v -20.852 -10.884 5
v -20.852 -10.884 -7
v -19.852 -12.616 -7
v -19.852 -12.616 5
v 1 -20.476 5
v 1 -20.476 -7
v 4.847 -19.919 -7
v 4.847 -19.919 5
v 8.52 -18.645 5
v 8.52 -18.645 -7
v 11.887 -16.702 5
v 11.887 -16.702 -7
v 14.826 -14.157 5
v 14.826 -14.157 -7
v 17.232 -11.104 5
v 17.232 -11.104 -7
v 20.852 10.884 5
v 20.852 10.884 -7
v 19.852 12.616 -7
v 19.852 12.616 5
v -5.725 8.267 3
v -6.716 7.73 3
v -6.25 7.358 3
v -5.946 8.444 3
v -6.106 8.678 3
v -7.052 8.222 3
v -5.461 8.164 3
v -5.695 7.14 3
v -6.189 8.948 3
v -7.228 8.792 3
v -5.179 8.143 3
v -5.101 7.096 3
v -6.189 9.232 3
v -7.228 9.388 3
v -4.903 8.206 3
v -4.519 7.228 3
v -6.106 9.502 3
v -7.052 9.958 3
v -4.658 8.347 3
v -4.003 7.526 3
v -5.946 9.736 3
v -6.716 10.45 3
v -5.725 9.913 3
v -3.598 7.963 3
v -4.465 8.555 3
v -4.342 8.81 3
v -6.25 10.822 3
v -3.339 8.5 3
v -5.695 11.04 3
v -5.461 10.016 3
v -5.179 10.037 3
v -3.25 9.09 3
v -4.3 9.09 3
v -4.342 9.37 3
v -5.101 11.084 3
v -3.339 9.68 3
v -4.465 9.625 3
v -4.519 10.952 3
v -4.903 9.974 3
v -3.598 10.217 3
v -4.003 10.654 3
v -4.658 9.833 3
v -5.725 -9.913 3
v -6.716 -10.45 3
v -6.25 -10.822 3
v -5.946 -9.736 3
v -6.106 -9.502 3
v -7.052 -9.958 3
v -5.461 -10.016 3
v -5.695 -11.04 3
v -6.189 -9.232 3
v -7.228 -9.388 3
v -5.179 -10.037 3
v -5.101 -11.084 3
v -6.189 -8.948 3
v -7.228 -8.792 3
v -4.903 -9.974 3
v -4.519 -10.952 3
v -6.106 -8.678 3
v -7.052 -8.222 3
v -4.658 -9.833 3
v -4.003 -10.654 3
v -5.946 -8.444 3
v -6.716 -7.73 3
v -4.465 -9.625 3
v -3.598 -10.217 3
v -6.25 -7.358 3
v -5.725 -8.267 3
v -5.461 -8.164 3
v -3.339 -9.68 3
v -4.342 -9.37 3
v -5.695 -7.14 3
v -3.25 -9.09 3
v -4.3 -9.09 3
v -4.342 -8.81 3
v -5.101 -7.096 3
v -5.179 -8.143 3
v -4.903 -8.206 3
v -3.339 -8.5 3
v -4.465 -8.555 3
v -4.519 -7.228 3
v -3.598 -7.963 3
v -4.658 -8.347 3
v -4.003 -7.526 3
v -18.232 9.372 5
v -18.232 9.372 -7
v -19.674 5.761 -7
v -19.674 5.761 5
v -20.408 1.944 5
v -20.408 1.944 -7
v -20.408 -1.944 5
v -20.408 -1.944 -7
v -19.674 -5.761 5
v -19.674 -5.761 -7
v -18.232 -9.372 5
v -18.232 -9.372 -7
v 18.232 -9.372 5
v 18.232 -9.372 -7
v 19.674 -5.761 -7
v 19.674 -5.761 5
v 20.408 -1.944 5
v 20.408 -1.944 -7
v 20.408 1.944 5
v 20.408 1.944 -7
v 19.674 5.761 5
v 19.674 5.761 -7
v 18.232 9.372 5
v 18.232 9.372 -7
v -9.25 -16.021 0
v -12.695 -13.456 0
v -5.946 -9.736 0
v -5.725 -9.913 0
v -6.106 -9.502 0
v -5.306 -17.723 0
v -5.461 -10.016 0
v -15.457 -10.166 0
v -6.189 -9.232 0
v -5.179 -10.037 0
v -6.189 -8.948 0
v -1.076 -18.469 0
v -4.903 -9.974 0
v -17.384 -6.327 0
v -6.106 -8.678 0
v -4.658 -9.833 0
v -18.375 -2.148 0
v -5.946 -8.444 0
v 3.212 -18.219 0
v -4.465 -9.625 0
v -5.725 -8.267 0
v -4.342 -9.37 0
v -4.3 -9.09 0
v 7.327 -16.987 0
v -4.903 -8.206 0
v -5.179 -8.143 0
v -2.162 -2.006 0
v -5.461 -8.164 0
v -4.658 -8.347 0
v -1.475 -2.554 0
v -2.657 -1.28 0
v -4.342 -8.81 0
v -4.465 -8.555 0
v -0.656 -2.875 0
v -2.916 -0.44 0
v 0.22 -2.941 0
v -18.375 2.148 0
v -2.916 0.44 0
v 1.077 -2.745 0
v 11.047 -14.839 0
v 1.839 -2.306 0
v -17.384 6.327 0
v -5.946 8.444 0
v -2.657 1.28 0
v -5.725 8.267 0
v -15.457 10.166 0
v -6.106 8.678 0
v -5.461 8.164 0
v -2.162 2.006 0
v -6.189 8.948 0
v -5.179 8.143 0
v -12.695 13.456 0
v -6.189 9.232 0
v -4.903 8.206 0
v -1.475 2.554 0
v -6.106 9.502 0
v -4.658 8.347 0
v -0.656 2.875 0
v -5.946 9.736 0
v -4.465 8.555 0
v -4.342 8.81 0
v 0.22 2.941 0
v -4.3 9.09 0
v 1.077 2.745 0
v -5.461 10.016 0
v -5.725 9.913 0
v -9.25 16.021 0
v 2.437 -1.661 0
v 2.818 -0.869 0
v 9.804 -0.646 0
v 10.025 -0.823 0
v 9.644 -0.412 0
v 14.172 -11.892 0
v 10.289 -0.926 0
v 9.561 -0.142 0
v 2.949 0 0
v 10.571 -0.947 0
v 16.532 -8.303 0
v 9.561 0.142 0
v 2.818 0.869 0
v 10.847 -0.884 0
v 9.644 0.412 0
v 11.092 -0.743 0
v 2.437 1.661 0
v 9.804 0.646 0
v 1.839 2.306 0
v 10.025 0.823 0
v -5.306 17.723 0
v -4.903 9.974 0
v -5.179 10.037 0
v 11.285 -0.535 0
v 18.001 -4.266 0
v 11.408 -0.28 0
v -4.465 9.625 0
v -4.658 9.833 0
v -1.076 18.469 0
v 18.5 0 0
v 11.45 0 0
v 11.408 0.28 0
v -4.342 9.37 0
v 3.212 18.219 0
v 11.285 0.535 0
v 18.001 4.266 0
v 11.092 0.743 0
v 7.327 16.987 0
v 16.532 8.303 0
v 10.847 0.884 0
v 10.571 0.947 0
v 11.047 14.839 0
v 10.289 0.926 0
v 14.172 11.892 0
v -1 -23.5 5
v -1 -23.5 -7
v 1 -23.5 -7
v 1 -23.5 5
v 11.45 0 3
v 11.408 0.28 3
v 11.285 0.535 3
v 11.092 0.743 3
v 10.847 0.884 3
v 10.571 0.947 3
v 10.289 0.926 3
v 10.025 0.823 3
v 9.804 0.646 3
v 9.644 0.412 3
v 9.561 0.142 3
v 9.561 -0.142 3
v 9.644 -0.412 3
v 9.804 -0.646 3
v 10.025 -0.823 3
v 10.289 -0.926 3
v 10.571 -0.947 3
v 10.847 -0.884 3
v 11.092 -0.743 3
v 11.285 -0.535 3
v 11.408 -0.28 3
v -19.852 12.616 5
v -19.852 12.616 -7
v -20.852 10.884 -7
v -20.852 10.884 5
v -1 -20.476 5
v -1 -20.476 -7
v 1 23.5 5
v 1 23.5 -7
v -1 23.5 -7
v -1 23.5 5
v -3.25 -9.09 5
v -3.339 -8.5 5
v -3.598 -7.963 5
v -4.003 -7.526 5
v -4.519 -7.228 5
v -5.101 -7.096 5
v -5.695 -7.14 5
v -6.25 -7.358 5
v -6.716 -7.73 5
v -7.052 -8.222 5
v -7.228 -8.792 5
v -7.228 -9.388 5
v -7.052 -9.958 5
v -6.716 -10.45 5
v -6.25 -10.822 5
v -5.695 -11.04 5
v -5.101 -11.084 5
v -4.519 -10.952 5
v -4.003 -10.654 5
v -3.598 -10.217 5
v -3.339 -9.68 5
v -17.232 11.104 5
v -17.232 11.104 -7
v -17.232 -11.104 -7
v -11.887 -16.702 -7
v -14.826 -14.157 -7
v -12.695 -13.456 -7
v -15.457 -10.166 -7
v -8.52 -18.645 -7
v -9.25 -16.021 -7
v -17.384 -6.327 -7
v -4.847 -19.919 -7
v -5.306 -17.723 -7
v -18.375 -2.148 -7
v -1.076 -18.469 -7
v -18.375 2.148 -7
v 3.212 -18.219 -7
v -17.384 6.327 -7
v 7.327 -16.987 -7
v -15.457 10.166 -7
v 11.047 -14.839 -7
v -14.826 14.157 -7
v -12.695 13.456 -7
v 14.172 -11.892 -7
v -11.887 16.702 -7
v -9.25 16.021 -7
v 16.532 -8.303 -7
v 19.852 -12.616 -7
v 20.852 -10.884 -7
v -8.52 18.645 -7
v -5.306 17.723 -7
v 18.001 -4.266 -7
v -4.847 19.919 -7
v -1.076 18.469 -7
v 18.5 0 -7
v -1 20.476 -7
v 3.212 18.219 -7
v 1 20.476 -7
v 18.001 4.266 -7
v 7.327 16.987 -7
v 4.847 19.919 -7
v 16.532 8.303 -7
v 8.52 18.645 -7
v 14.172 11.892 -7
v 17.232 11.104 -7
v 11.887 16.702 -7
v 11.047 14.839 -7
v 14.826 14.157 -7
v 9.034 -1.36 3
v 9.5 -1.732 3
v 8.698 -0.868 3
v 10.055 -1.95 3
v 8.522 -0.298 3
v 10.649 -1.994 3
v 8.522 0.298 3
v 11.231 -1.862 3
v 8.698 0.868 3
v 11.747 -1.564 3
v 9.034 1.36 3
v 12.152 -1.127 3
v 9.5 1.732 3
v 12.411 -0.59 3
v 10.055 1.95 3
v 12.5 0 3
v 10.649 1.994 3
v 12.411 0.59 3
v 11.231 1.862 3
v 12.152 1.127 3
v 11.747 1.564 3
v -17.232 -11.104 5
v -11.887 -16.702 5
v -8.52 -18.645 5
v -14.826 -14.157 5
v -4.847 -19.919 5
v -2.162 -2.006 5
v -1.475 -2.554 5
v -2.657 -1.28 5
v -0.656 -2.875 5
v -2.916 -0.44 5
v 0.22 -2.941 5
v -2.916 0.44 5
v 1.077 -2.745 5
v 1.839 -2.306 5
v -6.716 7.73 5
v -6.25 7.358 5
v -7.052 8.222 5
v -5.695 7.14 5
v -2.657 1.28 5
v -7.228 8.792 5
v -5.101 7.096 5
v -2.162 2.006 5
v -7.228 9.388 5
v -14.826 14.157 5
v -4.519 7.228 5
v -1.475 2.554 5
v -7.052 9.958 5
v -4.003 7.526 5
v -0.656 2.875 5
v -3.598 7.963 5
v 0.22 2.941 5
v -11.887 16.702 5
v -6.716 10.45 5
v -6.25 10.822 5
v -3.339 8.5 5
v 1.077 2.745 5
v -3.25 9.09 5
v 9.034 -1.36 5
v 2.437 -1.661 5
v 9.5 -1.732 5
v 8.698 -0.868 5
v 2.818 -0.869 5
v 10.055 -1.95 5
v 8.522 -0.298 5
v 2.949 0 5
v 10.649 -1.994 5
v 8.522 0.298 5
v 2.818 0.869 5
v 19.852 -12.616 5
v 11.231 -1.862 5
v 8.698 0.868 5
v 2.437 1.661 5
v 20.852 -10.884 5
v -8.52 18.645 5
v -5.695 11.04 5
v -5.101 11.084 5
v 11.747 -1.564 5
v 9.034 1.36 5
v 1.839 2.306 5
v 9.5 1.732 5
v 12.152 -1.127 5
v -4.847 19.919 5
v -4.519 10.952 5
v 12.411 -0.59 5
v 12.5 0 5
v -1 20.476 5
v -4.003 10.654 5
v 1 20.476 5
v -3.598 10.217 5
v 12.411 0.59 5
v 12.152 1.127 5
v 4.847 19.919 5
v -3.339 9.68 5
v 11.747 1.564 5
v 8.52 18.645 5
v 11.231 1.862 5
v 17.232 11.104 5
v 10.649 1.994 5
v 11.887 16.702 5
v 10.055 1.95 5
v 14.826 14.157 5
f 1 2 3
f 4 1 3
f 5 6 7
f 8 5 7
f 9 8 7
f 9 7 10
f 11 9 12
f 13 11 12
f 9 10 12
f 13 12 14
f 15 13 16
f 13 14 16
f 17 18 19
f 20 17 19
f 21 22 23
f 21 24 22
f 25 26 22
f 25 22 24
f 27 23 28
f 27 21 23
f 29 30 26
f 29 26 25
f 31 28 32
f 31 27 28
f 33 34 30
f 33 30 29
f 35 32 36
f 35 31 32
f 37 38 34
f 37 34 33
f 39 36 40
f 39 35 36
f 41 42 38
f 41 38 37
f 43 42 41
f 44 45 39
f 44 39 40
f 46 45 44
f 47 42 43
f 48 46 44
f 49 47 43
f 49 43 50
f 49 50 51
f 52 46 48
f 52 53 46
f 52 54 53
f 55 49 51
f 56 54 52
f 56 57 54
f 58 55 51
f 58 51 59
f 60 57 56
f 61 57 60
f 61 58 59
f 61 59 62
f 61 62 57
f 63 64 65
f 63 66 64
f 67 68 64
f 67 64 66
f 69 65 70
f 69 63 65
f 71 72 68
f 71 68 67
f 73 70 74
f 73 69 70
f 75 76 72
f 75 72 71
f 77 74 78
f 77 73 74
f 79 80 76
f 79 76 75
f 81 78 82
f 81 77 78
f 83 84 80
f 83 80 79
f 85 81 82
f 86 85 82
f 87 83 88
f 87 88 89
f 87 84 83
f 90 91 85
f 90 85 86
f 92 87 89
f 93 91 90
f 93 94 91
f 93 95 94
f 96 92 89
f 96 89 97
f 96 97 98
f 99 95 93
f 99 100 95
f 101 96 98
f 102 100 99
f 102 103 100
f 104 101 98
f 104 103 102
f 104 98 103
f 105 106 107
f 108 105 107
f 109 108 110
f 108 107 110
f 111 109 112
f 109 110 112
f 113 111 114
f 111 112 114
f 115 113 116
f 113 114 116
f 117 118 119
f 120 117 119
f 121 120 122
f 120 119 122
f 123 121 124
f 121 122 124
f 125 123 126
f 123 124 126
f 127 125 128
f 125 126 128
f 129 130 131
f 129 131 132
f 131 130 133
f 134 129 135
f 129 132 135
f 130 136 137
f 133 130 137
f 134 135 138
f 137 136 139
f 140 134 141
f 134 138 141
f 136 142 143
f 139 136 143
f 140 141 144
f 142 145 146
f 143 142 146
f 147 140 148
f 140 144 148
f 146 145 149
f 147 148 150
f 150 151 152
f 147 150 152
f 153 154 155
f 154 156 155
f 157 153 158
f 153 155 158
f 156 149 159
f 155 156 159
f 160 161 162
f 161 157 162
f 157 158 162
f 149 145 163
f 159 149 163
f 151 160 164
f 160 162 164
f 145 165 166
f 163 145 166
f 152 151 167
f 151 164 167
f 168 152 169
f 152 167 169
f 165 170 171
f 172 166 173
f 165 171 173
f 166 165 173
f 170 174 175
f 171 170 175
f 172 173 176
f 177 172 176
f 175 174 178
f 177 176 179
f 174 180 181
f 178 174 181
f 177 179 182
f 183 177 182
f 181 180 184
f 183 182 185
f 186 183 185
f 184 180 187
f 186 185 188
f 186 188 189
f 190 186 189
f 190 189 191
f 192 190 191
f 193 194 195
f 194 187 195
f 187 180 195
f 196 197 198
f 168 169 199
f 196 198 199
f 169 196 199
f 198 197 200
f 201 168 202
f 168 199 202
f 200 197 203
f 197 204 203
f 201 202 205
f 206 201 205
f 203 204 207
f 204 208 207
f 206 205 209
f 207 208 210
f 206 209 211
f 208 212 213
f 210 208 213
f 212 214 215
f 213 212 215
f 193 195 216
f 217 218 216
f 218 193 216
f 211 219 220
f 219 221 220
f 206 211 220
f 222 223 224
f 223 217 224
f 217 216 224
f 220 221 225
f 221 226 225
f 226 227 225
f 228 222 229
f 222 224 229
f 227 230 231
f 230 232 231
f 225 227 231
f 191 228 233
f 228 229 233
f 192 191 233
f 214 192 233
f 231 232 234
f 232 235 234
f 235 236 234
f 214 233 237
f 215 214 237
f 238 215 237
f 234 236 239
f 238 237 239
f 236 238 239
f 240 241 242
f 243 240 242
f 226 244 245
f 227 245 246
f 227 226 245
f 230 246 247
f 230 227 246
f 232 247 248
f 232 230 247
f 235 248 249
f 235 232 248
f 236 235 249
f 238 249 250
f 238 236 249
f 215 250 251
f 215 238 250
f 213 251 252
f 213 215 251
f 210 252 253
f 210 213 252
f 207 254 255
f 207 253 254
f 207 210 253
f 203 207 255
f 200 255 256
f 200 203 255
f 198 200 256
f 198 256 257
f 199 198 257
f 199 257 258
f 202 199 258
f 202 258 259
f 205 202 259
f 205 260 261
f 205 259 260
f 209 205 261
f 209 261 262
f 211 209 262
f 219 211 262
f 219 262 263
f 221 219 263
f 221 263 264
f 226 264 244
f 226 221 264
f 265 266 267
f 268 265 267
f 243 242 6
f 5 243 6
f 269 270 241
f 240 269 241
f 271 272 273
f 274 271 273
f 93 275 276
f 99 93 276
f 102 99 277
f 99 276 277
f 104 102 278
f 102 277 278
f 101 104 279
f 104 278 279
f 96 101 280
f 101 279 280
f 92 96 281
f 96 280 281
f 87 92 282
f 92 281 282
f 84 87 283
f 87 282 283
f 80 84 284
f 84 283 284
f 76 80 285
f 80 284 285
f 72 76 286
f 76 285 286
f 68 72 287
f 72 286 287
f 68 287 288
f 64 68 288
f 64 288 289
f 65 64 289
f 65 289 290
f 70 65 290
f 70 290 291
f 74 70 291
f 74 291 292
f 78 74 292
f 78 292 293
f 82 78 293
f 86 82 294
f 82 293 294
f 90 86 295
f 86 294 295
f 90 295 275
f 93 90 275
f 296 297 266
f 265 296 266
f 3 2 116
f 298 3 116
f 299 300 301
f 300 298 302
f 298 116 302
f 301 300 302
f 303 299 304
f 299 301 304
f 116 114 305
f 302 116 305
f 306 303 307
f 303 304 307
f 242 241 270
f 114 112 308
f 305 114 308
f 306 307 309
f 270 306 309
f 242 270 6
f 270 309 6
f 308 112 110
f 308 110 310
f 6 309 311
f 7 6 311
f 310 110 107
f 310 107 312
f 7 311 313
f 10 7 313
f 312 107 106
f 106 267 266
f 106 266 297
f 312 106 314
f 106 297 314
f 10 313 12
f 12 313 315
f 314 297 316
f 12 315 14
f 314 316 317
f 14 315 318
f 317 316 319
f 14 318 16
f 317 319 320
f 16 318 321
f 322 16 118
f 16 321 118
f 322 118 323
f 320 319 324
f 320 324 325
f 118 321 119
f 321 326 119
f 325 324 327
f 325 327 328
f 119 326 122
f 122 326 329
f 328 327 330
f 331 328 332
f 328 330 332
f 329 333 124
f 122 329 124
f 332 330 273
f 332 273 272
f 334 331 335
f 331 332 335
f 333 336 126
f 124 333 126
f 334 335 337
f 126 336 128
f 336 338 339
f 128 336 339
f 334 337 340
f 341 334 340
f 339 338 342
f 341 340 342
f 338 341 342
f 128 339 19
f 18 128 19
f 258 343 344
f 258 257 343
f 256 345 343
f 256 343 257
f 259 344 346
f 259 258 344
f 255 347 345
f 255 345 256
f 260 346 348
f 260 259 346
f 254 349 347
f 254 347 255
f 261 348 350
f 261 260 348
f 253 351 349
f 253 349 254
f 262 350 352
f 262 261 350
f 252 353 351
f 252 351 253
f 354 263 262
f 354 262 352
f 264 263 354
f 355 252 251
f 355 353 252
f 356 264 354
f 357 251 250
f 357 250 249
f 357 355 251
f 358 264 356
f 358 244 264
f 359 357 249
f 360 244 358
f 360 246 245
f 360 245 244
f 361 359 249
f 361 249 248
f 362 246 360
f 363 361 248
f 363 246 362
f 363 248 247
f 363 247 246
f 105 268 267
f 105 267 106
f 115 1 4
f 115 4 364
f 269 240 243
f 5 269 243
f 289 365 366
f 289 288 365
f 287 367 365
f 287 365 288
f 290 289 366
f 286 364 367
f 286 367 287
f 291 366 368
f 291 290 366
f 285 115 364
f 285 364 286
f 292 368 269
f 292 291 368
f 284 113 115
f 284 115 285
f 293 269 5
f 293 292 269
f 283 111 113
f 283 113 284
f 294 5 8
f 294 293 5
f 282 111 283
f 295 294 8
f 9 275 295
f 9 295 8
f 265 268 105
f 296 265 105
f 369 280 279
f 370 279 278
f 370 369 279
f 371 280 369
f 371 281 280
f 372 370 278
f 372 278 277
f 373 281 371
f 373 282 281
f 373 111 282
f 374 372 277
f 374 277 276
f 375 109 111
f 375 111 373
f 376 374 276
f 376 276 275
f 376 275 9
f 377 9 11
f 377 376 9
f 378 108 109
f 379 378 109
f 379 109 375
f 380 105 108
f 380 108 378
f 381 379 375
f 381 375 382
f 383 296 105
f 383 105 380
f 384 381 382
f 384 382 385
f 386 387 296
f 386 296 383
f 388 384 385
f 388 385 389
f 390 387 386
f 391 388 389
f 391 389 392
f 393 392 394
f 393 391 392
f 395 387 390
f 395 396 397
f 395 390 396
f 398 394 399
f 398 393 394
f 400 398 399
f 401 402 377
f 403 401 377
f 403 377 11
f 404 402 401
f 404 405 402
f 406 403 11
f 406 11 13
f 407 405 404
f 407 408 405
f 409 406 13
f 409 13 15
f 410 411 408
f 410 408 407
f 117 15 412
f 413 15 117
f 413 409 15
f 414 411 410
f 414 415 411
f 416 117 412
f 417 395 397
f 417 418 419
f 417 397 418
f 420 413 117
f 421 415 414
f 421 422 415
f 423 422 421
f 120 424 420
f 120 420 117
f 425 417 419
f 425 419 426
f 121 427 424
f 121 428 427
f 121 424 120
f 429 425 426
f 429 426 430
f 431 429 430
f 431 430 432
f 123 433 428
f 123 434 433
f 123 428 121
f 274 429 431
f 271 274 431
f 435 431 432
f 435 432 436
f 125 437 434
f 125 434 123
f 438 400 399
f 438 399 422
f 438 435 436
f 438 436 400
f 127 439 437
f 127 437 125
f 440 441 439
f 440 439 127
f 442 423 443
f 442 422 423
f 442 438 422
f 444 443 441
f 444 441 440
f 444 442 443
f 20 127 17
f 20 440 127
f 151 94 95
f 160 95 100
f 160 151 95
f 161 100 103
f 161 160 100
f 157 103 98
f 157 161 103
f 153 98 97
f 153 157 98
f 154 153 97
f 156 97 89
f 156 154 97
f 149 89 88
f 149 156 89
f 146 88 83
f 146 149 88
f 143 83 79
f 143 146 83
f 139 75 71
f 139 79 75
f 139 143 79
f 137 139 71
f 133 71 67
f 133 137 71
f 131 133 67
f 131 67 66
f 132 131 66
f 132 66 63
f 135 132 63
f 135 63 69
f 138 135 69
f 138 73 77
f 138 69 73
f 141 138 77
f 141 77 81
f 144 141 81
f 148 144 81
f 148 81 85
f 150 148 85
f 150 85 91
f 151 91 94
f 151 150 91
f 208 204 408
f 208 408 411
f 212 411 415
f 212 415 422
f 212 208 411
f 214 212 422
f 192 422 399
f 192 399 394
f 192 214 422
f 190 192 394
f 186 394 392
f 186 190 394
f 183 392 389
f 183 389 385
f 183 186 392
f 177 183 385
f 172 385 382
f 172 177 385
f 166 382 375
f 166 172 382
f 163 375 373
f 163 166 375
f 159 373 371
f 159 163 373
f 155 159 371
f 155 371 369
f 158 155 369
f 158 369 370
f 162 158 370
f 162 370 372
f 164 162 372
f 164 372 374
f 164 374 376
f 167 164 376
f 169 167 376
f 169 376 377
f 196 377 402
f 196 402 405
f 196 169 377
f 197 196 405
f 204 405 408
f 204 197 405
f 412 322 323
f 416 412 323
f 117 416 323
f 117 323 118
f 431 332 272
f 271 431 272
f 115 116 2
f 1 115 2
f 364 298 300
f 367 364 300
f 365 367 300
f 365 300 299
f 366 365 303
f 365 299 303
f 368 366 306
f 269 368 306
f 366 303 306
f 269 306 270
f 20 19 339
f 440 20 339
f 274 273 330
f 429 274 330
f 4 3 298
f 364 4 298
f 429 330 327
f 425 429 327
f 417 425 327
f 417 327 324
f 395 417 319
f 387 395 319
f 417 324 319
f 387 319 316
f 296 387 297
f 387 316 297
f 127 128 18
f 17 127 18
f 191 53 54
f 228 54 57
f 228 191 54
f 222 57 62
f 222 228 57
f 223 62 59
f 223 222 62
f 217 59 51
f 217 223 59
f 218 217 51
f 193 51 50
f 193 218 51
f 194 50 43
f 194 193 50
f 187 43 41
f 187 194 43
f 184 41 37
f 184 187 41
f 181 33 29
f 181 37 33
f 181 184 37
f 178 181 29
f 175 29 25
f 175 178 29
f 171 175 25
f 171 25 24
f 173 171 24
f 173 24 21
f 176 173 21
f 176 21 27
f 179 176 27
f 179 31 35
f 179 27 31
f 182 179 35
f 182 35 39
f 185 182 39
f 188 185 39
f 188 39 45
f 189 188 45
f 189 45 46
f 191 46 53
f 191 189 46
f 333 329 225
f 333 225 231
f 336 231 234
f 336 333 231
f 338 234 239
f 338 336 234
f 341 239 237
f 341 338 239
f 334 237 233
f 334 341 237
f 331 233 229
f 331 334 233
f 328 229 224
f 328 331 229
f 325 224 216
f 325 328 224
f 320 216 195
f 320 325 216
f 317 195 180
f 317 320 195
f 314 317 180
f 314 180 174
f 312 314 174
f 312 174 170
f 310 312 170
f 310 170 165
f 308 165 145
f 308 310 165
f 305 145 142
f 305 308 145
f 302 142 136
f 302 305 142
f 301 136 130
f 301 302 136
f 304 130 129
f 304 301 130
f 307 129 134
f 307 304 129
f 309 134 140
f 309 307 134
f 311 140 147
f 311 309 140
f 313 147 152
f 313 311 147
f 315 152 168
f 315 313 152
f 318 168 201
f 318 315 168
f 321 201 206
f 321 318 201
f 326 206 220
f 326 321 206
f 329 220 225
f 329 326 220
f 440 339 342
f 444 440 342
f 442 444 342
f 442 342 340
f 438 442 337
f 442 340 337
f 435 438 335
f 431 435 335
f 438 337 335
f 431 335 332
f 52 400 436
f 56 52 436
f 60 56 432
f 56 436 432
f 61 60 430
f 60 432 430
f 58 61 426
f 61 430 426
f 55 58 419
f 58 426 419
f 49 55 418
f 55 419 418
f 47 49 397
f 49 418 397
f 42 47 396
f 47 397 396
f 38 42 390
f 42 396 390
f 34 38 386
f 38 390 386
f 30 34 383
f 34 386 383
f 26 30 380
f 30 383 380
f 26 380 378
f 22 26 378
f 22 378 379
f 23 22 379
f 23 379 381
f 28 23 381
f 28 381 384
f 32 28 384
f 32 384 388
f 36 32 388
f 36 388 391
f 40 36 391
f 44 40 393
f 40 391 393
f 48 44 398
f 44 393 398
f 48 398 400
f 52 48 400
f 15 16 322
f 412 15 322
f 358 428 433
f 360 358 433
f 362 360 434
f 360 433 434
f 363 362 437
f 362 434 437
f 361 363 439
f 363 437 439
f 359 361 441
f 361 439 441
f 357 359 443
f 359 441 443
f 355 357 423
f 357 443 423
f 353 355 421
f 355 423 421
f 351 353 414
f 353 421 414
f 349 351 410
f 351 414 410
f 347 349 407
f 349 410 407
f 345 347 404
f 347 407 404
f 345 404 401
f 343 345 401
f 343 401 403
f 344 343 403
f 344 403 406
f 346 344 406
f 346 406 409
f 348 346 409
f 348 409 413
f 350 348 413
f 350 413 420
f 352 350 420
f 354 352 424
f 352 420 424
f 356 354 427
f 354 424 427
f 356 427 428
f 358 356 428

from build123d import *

# Parameters (mm, degrees)
SKETCH1_R           = 0.95
SKETCH1_R_2         = 2.949148862
BOSS_EXTRUDE1_DEPTH = 5
SKETCH2_R           = 2
CUT_EXTRUDE1_DEPTH  = 2
BOSS_EXTRUDE2_START = -7
SKETCH1_3_R         = 18.5
BOSS_EXTRUDE2_DEPTH = 7


with BuildPart() as part:
    # Sketch1 → Boss-Extrude1 (new body)
    with BuildSketch(Plane.XY):
        with BuildLine():
            Line((20.851596989, 10.883974596), (19.851596989, 12.616025404))
            Line((19.851596989, 12.616025404), (17.232385626, 11.103823019))
            ThreePointArc((17.232385626, 11.103823019), (10.25, 17.753520778), (1, 20.475595229))
            Line((1, 20.475595229), (1, 23.5))
            Line((1, 23.5), (-1, 23.5))
            Line((-1, 23.5), (-1, 20.475595229))
            ThreePointArc((-1, 20.475595229), (-10.25, 17.753520778), (-17.232385626, 11.103823019))
            Line((-17.232385626, 11.103823019), (-19.851596989, 12.616025404))
            Line((-19.851596989, 12.616025404), (-20.851596989, 10.883974596))
            Line((-20.851596989, 10.883974596), (-18.232385626, 9.371772211))
            ThreePointArc((-18.232385626, 9.371772211), (-20.5, 0), (-18.232385626, -9.371772211))
            Line((-18.232385626, -9.371772211), (-20.851596989, -10.883974596))
            Line((-20.851596989, -10.883974596), (-19.851596989, -12.616025404))
            Line((-19.851596989, -12.616025404), (-17.232385626, -11.103823019))
            ThreePointArc((-17.232385626, -11.103823019), (-10.25, -17.753520778), (-1, -20.475595229))
            Line((-1, -20.475595229), (-1, -23.5))
            Line((-1, -23.5), (1, -23.5))
            Line((1, -23.5), (1, -20.475595229))
            ThreePointArc((1, -20.475595229), (10.25, -17.753520778), (17.232385626, -11.103823019))
            Line((17.232385626, -11.103823019), (19.851596989, -12.616025404))
            Line((19.851596989, -12.616025404), (20.851596989, -10.883974596))
            Line((20.851596989, -10.883974596), (18.232385626, -9.371772211))
            ThreePointArc((18.232385626, -9.371772211), (20.5, 0), (18.232385626, 9.371772211))
            Line((18.232385626, 9.371772211), (20.851596989, 10.883974596))
        make_face()
        with Locations((10.5, 0)):
            Circle(SKETCH1_R, mode=Mode.SUBTRACT)
        with Locations((-5.25, -9.09)):
            Circle(SKETCH1_R, mode=Mode.SUBTRACT)
        with Locations((-5.25, 9.09)):
            Circle(SKETCH1_R, mode=Mode.SUBTRACT)
        Circle(SKETCH1_R_2, mode=Mode.SUBTRACT)
    extrude(amount=BOSS_EXTRUDE1_DEPTH)

    # Sketch2 → Cut-Extrude1 (cut)
    with BuildSketch(Plane.XY.offset(5)):
        with Locations((-5.25, 9.09)):
            Circle(SKETCH2_R)
        with Locations((-5.25, -9.09)):
            Circle(SKETCH2_R)
        with Locations((10.5, 0)):
            Circle(SKETCH2_R)
    extrude(amount=-CUT_EXTRUDE1_DEPTH, mode=Mode.SUBTRACT)

    # Sketch1<3> → Boss-Extrude2 (add)
    with BuildSketch(Plane.XY.offset(BOSS_EXTRUDE2_START)):
        with BuildLine():
            Line((20.851596989, 10.883974596), (19.851596989, 12.616025404))
            Line((19.851596989, 12.616025404), (17.232385626, 11.103823019))
            ThreePointArc((17.232385626, 11.103823019), (10.25, 17.753520778), (1, 20.475595229))
            Line((1, 20.475595229), (1, 23.5))
            Line((1, 23.5), (-1, 23.5))
            Line((-1, 23.5), (-1, 20.475595229))
            ThreePointArc((-1, 20.475595229), (-10.25, 17.753520778), (-17.232385626, 11.103823019))
            Line((-17.232385626, 11.103823019), (-19.851596989, 12.616025404))
            Line((-19.851596989, 12.616025404), (-20.851596989, 10.883974596))
            Line((-20.851596989, 10.883974596), (-18.232385626, 9.371772211))
            ThreePointArc((-18.232385626, 9.371772211), (-20.5, 0), (-18.232385626, -9.371772211))
            Line((-18.232385626, -9.371772211), (-20.851596989, -10.883974596))
            Line((-20.851596989, -10.883974596), (-19.851596989, -12.616025404))
            Line((-19.851596989, -12.616025404), (-17.232385626, -11.103823019))
            ThreePointArc((-17.232385626, -11.103823019), (-10.25, -17.753520778), (-1, -20.475595229))
            Line((-1, -20.475595229), (-1, -23.5))
            Line((-1, -23.5), (1, -23.5))
            Line((1, -23.5), (1, -20.475595229))
            ThreePointArc((1, -20.475595229), (10.25, -17.753520778), (17.232385626, -11.103823019))
            Line((17.232385626, -11.103823019), (19.851596989, -12.616025404))
            Line((19.851596989, -12.616025404), (20.851596989, -10.883974596))
            Line((20.851596989, -10.883974596), (18.232385626, -9.371772211))
            ThreePointArc((18.232385626, -9.371772211), (20.5, 0), (18.232385626, 9.371772211))
            Line((18.232385626, 9.371772211), (20.851596989, 10.883974596))
        make_face()
        Circle(SKETCH1_3_R, mode=Mode.SUBTRACT)
    extrude(amount=BOSS_EXTRUDE2_DEPTH)


solid = part.part
